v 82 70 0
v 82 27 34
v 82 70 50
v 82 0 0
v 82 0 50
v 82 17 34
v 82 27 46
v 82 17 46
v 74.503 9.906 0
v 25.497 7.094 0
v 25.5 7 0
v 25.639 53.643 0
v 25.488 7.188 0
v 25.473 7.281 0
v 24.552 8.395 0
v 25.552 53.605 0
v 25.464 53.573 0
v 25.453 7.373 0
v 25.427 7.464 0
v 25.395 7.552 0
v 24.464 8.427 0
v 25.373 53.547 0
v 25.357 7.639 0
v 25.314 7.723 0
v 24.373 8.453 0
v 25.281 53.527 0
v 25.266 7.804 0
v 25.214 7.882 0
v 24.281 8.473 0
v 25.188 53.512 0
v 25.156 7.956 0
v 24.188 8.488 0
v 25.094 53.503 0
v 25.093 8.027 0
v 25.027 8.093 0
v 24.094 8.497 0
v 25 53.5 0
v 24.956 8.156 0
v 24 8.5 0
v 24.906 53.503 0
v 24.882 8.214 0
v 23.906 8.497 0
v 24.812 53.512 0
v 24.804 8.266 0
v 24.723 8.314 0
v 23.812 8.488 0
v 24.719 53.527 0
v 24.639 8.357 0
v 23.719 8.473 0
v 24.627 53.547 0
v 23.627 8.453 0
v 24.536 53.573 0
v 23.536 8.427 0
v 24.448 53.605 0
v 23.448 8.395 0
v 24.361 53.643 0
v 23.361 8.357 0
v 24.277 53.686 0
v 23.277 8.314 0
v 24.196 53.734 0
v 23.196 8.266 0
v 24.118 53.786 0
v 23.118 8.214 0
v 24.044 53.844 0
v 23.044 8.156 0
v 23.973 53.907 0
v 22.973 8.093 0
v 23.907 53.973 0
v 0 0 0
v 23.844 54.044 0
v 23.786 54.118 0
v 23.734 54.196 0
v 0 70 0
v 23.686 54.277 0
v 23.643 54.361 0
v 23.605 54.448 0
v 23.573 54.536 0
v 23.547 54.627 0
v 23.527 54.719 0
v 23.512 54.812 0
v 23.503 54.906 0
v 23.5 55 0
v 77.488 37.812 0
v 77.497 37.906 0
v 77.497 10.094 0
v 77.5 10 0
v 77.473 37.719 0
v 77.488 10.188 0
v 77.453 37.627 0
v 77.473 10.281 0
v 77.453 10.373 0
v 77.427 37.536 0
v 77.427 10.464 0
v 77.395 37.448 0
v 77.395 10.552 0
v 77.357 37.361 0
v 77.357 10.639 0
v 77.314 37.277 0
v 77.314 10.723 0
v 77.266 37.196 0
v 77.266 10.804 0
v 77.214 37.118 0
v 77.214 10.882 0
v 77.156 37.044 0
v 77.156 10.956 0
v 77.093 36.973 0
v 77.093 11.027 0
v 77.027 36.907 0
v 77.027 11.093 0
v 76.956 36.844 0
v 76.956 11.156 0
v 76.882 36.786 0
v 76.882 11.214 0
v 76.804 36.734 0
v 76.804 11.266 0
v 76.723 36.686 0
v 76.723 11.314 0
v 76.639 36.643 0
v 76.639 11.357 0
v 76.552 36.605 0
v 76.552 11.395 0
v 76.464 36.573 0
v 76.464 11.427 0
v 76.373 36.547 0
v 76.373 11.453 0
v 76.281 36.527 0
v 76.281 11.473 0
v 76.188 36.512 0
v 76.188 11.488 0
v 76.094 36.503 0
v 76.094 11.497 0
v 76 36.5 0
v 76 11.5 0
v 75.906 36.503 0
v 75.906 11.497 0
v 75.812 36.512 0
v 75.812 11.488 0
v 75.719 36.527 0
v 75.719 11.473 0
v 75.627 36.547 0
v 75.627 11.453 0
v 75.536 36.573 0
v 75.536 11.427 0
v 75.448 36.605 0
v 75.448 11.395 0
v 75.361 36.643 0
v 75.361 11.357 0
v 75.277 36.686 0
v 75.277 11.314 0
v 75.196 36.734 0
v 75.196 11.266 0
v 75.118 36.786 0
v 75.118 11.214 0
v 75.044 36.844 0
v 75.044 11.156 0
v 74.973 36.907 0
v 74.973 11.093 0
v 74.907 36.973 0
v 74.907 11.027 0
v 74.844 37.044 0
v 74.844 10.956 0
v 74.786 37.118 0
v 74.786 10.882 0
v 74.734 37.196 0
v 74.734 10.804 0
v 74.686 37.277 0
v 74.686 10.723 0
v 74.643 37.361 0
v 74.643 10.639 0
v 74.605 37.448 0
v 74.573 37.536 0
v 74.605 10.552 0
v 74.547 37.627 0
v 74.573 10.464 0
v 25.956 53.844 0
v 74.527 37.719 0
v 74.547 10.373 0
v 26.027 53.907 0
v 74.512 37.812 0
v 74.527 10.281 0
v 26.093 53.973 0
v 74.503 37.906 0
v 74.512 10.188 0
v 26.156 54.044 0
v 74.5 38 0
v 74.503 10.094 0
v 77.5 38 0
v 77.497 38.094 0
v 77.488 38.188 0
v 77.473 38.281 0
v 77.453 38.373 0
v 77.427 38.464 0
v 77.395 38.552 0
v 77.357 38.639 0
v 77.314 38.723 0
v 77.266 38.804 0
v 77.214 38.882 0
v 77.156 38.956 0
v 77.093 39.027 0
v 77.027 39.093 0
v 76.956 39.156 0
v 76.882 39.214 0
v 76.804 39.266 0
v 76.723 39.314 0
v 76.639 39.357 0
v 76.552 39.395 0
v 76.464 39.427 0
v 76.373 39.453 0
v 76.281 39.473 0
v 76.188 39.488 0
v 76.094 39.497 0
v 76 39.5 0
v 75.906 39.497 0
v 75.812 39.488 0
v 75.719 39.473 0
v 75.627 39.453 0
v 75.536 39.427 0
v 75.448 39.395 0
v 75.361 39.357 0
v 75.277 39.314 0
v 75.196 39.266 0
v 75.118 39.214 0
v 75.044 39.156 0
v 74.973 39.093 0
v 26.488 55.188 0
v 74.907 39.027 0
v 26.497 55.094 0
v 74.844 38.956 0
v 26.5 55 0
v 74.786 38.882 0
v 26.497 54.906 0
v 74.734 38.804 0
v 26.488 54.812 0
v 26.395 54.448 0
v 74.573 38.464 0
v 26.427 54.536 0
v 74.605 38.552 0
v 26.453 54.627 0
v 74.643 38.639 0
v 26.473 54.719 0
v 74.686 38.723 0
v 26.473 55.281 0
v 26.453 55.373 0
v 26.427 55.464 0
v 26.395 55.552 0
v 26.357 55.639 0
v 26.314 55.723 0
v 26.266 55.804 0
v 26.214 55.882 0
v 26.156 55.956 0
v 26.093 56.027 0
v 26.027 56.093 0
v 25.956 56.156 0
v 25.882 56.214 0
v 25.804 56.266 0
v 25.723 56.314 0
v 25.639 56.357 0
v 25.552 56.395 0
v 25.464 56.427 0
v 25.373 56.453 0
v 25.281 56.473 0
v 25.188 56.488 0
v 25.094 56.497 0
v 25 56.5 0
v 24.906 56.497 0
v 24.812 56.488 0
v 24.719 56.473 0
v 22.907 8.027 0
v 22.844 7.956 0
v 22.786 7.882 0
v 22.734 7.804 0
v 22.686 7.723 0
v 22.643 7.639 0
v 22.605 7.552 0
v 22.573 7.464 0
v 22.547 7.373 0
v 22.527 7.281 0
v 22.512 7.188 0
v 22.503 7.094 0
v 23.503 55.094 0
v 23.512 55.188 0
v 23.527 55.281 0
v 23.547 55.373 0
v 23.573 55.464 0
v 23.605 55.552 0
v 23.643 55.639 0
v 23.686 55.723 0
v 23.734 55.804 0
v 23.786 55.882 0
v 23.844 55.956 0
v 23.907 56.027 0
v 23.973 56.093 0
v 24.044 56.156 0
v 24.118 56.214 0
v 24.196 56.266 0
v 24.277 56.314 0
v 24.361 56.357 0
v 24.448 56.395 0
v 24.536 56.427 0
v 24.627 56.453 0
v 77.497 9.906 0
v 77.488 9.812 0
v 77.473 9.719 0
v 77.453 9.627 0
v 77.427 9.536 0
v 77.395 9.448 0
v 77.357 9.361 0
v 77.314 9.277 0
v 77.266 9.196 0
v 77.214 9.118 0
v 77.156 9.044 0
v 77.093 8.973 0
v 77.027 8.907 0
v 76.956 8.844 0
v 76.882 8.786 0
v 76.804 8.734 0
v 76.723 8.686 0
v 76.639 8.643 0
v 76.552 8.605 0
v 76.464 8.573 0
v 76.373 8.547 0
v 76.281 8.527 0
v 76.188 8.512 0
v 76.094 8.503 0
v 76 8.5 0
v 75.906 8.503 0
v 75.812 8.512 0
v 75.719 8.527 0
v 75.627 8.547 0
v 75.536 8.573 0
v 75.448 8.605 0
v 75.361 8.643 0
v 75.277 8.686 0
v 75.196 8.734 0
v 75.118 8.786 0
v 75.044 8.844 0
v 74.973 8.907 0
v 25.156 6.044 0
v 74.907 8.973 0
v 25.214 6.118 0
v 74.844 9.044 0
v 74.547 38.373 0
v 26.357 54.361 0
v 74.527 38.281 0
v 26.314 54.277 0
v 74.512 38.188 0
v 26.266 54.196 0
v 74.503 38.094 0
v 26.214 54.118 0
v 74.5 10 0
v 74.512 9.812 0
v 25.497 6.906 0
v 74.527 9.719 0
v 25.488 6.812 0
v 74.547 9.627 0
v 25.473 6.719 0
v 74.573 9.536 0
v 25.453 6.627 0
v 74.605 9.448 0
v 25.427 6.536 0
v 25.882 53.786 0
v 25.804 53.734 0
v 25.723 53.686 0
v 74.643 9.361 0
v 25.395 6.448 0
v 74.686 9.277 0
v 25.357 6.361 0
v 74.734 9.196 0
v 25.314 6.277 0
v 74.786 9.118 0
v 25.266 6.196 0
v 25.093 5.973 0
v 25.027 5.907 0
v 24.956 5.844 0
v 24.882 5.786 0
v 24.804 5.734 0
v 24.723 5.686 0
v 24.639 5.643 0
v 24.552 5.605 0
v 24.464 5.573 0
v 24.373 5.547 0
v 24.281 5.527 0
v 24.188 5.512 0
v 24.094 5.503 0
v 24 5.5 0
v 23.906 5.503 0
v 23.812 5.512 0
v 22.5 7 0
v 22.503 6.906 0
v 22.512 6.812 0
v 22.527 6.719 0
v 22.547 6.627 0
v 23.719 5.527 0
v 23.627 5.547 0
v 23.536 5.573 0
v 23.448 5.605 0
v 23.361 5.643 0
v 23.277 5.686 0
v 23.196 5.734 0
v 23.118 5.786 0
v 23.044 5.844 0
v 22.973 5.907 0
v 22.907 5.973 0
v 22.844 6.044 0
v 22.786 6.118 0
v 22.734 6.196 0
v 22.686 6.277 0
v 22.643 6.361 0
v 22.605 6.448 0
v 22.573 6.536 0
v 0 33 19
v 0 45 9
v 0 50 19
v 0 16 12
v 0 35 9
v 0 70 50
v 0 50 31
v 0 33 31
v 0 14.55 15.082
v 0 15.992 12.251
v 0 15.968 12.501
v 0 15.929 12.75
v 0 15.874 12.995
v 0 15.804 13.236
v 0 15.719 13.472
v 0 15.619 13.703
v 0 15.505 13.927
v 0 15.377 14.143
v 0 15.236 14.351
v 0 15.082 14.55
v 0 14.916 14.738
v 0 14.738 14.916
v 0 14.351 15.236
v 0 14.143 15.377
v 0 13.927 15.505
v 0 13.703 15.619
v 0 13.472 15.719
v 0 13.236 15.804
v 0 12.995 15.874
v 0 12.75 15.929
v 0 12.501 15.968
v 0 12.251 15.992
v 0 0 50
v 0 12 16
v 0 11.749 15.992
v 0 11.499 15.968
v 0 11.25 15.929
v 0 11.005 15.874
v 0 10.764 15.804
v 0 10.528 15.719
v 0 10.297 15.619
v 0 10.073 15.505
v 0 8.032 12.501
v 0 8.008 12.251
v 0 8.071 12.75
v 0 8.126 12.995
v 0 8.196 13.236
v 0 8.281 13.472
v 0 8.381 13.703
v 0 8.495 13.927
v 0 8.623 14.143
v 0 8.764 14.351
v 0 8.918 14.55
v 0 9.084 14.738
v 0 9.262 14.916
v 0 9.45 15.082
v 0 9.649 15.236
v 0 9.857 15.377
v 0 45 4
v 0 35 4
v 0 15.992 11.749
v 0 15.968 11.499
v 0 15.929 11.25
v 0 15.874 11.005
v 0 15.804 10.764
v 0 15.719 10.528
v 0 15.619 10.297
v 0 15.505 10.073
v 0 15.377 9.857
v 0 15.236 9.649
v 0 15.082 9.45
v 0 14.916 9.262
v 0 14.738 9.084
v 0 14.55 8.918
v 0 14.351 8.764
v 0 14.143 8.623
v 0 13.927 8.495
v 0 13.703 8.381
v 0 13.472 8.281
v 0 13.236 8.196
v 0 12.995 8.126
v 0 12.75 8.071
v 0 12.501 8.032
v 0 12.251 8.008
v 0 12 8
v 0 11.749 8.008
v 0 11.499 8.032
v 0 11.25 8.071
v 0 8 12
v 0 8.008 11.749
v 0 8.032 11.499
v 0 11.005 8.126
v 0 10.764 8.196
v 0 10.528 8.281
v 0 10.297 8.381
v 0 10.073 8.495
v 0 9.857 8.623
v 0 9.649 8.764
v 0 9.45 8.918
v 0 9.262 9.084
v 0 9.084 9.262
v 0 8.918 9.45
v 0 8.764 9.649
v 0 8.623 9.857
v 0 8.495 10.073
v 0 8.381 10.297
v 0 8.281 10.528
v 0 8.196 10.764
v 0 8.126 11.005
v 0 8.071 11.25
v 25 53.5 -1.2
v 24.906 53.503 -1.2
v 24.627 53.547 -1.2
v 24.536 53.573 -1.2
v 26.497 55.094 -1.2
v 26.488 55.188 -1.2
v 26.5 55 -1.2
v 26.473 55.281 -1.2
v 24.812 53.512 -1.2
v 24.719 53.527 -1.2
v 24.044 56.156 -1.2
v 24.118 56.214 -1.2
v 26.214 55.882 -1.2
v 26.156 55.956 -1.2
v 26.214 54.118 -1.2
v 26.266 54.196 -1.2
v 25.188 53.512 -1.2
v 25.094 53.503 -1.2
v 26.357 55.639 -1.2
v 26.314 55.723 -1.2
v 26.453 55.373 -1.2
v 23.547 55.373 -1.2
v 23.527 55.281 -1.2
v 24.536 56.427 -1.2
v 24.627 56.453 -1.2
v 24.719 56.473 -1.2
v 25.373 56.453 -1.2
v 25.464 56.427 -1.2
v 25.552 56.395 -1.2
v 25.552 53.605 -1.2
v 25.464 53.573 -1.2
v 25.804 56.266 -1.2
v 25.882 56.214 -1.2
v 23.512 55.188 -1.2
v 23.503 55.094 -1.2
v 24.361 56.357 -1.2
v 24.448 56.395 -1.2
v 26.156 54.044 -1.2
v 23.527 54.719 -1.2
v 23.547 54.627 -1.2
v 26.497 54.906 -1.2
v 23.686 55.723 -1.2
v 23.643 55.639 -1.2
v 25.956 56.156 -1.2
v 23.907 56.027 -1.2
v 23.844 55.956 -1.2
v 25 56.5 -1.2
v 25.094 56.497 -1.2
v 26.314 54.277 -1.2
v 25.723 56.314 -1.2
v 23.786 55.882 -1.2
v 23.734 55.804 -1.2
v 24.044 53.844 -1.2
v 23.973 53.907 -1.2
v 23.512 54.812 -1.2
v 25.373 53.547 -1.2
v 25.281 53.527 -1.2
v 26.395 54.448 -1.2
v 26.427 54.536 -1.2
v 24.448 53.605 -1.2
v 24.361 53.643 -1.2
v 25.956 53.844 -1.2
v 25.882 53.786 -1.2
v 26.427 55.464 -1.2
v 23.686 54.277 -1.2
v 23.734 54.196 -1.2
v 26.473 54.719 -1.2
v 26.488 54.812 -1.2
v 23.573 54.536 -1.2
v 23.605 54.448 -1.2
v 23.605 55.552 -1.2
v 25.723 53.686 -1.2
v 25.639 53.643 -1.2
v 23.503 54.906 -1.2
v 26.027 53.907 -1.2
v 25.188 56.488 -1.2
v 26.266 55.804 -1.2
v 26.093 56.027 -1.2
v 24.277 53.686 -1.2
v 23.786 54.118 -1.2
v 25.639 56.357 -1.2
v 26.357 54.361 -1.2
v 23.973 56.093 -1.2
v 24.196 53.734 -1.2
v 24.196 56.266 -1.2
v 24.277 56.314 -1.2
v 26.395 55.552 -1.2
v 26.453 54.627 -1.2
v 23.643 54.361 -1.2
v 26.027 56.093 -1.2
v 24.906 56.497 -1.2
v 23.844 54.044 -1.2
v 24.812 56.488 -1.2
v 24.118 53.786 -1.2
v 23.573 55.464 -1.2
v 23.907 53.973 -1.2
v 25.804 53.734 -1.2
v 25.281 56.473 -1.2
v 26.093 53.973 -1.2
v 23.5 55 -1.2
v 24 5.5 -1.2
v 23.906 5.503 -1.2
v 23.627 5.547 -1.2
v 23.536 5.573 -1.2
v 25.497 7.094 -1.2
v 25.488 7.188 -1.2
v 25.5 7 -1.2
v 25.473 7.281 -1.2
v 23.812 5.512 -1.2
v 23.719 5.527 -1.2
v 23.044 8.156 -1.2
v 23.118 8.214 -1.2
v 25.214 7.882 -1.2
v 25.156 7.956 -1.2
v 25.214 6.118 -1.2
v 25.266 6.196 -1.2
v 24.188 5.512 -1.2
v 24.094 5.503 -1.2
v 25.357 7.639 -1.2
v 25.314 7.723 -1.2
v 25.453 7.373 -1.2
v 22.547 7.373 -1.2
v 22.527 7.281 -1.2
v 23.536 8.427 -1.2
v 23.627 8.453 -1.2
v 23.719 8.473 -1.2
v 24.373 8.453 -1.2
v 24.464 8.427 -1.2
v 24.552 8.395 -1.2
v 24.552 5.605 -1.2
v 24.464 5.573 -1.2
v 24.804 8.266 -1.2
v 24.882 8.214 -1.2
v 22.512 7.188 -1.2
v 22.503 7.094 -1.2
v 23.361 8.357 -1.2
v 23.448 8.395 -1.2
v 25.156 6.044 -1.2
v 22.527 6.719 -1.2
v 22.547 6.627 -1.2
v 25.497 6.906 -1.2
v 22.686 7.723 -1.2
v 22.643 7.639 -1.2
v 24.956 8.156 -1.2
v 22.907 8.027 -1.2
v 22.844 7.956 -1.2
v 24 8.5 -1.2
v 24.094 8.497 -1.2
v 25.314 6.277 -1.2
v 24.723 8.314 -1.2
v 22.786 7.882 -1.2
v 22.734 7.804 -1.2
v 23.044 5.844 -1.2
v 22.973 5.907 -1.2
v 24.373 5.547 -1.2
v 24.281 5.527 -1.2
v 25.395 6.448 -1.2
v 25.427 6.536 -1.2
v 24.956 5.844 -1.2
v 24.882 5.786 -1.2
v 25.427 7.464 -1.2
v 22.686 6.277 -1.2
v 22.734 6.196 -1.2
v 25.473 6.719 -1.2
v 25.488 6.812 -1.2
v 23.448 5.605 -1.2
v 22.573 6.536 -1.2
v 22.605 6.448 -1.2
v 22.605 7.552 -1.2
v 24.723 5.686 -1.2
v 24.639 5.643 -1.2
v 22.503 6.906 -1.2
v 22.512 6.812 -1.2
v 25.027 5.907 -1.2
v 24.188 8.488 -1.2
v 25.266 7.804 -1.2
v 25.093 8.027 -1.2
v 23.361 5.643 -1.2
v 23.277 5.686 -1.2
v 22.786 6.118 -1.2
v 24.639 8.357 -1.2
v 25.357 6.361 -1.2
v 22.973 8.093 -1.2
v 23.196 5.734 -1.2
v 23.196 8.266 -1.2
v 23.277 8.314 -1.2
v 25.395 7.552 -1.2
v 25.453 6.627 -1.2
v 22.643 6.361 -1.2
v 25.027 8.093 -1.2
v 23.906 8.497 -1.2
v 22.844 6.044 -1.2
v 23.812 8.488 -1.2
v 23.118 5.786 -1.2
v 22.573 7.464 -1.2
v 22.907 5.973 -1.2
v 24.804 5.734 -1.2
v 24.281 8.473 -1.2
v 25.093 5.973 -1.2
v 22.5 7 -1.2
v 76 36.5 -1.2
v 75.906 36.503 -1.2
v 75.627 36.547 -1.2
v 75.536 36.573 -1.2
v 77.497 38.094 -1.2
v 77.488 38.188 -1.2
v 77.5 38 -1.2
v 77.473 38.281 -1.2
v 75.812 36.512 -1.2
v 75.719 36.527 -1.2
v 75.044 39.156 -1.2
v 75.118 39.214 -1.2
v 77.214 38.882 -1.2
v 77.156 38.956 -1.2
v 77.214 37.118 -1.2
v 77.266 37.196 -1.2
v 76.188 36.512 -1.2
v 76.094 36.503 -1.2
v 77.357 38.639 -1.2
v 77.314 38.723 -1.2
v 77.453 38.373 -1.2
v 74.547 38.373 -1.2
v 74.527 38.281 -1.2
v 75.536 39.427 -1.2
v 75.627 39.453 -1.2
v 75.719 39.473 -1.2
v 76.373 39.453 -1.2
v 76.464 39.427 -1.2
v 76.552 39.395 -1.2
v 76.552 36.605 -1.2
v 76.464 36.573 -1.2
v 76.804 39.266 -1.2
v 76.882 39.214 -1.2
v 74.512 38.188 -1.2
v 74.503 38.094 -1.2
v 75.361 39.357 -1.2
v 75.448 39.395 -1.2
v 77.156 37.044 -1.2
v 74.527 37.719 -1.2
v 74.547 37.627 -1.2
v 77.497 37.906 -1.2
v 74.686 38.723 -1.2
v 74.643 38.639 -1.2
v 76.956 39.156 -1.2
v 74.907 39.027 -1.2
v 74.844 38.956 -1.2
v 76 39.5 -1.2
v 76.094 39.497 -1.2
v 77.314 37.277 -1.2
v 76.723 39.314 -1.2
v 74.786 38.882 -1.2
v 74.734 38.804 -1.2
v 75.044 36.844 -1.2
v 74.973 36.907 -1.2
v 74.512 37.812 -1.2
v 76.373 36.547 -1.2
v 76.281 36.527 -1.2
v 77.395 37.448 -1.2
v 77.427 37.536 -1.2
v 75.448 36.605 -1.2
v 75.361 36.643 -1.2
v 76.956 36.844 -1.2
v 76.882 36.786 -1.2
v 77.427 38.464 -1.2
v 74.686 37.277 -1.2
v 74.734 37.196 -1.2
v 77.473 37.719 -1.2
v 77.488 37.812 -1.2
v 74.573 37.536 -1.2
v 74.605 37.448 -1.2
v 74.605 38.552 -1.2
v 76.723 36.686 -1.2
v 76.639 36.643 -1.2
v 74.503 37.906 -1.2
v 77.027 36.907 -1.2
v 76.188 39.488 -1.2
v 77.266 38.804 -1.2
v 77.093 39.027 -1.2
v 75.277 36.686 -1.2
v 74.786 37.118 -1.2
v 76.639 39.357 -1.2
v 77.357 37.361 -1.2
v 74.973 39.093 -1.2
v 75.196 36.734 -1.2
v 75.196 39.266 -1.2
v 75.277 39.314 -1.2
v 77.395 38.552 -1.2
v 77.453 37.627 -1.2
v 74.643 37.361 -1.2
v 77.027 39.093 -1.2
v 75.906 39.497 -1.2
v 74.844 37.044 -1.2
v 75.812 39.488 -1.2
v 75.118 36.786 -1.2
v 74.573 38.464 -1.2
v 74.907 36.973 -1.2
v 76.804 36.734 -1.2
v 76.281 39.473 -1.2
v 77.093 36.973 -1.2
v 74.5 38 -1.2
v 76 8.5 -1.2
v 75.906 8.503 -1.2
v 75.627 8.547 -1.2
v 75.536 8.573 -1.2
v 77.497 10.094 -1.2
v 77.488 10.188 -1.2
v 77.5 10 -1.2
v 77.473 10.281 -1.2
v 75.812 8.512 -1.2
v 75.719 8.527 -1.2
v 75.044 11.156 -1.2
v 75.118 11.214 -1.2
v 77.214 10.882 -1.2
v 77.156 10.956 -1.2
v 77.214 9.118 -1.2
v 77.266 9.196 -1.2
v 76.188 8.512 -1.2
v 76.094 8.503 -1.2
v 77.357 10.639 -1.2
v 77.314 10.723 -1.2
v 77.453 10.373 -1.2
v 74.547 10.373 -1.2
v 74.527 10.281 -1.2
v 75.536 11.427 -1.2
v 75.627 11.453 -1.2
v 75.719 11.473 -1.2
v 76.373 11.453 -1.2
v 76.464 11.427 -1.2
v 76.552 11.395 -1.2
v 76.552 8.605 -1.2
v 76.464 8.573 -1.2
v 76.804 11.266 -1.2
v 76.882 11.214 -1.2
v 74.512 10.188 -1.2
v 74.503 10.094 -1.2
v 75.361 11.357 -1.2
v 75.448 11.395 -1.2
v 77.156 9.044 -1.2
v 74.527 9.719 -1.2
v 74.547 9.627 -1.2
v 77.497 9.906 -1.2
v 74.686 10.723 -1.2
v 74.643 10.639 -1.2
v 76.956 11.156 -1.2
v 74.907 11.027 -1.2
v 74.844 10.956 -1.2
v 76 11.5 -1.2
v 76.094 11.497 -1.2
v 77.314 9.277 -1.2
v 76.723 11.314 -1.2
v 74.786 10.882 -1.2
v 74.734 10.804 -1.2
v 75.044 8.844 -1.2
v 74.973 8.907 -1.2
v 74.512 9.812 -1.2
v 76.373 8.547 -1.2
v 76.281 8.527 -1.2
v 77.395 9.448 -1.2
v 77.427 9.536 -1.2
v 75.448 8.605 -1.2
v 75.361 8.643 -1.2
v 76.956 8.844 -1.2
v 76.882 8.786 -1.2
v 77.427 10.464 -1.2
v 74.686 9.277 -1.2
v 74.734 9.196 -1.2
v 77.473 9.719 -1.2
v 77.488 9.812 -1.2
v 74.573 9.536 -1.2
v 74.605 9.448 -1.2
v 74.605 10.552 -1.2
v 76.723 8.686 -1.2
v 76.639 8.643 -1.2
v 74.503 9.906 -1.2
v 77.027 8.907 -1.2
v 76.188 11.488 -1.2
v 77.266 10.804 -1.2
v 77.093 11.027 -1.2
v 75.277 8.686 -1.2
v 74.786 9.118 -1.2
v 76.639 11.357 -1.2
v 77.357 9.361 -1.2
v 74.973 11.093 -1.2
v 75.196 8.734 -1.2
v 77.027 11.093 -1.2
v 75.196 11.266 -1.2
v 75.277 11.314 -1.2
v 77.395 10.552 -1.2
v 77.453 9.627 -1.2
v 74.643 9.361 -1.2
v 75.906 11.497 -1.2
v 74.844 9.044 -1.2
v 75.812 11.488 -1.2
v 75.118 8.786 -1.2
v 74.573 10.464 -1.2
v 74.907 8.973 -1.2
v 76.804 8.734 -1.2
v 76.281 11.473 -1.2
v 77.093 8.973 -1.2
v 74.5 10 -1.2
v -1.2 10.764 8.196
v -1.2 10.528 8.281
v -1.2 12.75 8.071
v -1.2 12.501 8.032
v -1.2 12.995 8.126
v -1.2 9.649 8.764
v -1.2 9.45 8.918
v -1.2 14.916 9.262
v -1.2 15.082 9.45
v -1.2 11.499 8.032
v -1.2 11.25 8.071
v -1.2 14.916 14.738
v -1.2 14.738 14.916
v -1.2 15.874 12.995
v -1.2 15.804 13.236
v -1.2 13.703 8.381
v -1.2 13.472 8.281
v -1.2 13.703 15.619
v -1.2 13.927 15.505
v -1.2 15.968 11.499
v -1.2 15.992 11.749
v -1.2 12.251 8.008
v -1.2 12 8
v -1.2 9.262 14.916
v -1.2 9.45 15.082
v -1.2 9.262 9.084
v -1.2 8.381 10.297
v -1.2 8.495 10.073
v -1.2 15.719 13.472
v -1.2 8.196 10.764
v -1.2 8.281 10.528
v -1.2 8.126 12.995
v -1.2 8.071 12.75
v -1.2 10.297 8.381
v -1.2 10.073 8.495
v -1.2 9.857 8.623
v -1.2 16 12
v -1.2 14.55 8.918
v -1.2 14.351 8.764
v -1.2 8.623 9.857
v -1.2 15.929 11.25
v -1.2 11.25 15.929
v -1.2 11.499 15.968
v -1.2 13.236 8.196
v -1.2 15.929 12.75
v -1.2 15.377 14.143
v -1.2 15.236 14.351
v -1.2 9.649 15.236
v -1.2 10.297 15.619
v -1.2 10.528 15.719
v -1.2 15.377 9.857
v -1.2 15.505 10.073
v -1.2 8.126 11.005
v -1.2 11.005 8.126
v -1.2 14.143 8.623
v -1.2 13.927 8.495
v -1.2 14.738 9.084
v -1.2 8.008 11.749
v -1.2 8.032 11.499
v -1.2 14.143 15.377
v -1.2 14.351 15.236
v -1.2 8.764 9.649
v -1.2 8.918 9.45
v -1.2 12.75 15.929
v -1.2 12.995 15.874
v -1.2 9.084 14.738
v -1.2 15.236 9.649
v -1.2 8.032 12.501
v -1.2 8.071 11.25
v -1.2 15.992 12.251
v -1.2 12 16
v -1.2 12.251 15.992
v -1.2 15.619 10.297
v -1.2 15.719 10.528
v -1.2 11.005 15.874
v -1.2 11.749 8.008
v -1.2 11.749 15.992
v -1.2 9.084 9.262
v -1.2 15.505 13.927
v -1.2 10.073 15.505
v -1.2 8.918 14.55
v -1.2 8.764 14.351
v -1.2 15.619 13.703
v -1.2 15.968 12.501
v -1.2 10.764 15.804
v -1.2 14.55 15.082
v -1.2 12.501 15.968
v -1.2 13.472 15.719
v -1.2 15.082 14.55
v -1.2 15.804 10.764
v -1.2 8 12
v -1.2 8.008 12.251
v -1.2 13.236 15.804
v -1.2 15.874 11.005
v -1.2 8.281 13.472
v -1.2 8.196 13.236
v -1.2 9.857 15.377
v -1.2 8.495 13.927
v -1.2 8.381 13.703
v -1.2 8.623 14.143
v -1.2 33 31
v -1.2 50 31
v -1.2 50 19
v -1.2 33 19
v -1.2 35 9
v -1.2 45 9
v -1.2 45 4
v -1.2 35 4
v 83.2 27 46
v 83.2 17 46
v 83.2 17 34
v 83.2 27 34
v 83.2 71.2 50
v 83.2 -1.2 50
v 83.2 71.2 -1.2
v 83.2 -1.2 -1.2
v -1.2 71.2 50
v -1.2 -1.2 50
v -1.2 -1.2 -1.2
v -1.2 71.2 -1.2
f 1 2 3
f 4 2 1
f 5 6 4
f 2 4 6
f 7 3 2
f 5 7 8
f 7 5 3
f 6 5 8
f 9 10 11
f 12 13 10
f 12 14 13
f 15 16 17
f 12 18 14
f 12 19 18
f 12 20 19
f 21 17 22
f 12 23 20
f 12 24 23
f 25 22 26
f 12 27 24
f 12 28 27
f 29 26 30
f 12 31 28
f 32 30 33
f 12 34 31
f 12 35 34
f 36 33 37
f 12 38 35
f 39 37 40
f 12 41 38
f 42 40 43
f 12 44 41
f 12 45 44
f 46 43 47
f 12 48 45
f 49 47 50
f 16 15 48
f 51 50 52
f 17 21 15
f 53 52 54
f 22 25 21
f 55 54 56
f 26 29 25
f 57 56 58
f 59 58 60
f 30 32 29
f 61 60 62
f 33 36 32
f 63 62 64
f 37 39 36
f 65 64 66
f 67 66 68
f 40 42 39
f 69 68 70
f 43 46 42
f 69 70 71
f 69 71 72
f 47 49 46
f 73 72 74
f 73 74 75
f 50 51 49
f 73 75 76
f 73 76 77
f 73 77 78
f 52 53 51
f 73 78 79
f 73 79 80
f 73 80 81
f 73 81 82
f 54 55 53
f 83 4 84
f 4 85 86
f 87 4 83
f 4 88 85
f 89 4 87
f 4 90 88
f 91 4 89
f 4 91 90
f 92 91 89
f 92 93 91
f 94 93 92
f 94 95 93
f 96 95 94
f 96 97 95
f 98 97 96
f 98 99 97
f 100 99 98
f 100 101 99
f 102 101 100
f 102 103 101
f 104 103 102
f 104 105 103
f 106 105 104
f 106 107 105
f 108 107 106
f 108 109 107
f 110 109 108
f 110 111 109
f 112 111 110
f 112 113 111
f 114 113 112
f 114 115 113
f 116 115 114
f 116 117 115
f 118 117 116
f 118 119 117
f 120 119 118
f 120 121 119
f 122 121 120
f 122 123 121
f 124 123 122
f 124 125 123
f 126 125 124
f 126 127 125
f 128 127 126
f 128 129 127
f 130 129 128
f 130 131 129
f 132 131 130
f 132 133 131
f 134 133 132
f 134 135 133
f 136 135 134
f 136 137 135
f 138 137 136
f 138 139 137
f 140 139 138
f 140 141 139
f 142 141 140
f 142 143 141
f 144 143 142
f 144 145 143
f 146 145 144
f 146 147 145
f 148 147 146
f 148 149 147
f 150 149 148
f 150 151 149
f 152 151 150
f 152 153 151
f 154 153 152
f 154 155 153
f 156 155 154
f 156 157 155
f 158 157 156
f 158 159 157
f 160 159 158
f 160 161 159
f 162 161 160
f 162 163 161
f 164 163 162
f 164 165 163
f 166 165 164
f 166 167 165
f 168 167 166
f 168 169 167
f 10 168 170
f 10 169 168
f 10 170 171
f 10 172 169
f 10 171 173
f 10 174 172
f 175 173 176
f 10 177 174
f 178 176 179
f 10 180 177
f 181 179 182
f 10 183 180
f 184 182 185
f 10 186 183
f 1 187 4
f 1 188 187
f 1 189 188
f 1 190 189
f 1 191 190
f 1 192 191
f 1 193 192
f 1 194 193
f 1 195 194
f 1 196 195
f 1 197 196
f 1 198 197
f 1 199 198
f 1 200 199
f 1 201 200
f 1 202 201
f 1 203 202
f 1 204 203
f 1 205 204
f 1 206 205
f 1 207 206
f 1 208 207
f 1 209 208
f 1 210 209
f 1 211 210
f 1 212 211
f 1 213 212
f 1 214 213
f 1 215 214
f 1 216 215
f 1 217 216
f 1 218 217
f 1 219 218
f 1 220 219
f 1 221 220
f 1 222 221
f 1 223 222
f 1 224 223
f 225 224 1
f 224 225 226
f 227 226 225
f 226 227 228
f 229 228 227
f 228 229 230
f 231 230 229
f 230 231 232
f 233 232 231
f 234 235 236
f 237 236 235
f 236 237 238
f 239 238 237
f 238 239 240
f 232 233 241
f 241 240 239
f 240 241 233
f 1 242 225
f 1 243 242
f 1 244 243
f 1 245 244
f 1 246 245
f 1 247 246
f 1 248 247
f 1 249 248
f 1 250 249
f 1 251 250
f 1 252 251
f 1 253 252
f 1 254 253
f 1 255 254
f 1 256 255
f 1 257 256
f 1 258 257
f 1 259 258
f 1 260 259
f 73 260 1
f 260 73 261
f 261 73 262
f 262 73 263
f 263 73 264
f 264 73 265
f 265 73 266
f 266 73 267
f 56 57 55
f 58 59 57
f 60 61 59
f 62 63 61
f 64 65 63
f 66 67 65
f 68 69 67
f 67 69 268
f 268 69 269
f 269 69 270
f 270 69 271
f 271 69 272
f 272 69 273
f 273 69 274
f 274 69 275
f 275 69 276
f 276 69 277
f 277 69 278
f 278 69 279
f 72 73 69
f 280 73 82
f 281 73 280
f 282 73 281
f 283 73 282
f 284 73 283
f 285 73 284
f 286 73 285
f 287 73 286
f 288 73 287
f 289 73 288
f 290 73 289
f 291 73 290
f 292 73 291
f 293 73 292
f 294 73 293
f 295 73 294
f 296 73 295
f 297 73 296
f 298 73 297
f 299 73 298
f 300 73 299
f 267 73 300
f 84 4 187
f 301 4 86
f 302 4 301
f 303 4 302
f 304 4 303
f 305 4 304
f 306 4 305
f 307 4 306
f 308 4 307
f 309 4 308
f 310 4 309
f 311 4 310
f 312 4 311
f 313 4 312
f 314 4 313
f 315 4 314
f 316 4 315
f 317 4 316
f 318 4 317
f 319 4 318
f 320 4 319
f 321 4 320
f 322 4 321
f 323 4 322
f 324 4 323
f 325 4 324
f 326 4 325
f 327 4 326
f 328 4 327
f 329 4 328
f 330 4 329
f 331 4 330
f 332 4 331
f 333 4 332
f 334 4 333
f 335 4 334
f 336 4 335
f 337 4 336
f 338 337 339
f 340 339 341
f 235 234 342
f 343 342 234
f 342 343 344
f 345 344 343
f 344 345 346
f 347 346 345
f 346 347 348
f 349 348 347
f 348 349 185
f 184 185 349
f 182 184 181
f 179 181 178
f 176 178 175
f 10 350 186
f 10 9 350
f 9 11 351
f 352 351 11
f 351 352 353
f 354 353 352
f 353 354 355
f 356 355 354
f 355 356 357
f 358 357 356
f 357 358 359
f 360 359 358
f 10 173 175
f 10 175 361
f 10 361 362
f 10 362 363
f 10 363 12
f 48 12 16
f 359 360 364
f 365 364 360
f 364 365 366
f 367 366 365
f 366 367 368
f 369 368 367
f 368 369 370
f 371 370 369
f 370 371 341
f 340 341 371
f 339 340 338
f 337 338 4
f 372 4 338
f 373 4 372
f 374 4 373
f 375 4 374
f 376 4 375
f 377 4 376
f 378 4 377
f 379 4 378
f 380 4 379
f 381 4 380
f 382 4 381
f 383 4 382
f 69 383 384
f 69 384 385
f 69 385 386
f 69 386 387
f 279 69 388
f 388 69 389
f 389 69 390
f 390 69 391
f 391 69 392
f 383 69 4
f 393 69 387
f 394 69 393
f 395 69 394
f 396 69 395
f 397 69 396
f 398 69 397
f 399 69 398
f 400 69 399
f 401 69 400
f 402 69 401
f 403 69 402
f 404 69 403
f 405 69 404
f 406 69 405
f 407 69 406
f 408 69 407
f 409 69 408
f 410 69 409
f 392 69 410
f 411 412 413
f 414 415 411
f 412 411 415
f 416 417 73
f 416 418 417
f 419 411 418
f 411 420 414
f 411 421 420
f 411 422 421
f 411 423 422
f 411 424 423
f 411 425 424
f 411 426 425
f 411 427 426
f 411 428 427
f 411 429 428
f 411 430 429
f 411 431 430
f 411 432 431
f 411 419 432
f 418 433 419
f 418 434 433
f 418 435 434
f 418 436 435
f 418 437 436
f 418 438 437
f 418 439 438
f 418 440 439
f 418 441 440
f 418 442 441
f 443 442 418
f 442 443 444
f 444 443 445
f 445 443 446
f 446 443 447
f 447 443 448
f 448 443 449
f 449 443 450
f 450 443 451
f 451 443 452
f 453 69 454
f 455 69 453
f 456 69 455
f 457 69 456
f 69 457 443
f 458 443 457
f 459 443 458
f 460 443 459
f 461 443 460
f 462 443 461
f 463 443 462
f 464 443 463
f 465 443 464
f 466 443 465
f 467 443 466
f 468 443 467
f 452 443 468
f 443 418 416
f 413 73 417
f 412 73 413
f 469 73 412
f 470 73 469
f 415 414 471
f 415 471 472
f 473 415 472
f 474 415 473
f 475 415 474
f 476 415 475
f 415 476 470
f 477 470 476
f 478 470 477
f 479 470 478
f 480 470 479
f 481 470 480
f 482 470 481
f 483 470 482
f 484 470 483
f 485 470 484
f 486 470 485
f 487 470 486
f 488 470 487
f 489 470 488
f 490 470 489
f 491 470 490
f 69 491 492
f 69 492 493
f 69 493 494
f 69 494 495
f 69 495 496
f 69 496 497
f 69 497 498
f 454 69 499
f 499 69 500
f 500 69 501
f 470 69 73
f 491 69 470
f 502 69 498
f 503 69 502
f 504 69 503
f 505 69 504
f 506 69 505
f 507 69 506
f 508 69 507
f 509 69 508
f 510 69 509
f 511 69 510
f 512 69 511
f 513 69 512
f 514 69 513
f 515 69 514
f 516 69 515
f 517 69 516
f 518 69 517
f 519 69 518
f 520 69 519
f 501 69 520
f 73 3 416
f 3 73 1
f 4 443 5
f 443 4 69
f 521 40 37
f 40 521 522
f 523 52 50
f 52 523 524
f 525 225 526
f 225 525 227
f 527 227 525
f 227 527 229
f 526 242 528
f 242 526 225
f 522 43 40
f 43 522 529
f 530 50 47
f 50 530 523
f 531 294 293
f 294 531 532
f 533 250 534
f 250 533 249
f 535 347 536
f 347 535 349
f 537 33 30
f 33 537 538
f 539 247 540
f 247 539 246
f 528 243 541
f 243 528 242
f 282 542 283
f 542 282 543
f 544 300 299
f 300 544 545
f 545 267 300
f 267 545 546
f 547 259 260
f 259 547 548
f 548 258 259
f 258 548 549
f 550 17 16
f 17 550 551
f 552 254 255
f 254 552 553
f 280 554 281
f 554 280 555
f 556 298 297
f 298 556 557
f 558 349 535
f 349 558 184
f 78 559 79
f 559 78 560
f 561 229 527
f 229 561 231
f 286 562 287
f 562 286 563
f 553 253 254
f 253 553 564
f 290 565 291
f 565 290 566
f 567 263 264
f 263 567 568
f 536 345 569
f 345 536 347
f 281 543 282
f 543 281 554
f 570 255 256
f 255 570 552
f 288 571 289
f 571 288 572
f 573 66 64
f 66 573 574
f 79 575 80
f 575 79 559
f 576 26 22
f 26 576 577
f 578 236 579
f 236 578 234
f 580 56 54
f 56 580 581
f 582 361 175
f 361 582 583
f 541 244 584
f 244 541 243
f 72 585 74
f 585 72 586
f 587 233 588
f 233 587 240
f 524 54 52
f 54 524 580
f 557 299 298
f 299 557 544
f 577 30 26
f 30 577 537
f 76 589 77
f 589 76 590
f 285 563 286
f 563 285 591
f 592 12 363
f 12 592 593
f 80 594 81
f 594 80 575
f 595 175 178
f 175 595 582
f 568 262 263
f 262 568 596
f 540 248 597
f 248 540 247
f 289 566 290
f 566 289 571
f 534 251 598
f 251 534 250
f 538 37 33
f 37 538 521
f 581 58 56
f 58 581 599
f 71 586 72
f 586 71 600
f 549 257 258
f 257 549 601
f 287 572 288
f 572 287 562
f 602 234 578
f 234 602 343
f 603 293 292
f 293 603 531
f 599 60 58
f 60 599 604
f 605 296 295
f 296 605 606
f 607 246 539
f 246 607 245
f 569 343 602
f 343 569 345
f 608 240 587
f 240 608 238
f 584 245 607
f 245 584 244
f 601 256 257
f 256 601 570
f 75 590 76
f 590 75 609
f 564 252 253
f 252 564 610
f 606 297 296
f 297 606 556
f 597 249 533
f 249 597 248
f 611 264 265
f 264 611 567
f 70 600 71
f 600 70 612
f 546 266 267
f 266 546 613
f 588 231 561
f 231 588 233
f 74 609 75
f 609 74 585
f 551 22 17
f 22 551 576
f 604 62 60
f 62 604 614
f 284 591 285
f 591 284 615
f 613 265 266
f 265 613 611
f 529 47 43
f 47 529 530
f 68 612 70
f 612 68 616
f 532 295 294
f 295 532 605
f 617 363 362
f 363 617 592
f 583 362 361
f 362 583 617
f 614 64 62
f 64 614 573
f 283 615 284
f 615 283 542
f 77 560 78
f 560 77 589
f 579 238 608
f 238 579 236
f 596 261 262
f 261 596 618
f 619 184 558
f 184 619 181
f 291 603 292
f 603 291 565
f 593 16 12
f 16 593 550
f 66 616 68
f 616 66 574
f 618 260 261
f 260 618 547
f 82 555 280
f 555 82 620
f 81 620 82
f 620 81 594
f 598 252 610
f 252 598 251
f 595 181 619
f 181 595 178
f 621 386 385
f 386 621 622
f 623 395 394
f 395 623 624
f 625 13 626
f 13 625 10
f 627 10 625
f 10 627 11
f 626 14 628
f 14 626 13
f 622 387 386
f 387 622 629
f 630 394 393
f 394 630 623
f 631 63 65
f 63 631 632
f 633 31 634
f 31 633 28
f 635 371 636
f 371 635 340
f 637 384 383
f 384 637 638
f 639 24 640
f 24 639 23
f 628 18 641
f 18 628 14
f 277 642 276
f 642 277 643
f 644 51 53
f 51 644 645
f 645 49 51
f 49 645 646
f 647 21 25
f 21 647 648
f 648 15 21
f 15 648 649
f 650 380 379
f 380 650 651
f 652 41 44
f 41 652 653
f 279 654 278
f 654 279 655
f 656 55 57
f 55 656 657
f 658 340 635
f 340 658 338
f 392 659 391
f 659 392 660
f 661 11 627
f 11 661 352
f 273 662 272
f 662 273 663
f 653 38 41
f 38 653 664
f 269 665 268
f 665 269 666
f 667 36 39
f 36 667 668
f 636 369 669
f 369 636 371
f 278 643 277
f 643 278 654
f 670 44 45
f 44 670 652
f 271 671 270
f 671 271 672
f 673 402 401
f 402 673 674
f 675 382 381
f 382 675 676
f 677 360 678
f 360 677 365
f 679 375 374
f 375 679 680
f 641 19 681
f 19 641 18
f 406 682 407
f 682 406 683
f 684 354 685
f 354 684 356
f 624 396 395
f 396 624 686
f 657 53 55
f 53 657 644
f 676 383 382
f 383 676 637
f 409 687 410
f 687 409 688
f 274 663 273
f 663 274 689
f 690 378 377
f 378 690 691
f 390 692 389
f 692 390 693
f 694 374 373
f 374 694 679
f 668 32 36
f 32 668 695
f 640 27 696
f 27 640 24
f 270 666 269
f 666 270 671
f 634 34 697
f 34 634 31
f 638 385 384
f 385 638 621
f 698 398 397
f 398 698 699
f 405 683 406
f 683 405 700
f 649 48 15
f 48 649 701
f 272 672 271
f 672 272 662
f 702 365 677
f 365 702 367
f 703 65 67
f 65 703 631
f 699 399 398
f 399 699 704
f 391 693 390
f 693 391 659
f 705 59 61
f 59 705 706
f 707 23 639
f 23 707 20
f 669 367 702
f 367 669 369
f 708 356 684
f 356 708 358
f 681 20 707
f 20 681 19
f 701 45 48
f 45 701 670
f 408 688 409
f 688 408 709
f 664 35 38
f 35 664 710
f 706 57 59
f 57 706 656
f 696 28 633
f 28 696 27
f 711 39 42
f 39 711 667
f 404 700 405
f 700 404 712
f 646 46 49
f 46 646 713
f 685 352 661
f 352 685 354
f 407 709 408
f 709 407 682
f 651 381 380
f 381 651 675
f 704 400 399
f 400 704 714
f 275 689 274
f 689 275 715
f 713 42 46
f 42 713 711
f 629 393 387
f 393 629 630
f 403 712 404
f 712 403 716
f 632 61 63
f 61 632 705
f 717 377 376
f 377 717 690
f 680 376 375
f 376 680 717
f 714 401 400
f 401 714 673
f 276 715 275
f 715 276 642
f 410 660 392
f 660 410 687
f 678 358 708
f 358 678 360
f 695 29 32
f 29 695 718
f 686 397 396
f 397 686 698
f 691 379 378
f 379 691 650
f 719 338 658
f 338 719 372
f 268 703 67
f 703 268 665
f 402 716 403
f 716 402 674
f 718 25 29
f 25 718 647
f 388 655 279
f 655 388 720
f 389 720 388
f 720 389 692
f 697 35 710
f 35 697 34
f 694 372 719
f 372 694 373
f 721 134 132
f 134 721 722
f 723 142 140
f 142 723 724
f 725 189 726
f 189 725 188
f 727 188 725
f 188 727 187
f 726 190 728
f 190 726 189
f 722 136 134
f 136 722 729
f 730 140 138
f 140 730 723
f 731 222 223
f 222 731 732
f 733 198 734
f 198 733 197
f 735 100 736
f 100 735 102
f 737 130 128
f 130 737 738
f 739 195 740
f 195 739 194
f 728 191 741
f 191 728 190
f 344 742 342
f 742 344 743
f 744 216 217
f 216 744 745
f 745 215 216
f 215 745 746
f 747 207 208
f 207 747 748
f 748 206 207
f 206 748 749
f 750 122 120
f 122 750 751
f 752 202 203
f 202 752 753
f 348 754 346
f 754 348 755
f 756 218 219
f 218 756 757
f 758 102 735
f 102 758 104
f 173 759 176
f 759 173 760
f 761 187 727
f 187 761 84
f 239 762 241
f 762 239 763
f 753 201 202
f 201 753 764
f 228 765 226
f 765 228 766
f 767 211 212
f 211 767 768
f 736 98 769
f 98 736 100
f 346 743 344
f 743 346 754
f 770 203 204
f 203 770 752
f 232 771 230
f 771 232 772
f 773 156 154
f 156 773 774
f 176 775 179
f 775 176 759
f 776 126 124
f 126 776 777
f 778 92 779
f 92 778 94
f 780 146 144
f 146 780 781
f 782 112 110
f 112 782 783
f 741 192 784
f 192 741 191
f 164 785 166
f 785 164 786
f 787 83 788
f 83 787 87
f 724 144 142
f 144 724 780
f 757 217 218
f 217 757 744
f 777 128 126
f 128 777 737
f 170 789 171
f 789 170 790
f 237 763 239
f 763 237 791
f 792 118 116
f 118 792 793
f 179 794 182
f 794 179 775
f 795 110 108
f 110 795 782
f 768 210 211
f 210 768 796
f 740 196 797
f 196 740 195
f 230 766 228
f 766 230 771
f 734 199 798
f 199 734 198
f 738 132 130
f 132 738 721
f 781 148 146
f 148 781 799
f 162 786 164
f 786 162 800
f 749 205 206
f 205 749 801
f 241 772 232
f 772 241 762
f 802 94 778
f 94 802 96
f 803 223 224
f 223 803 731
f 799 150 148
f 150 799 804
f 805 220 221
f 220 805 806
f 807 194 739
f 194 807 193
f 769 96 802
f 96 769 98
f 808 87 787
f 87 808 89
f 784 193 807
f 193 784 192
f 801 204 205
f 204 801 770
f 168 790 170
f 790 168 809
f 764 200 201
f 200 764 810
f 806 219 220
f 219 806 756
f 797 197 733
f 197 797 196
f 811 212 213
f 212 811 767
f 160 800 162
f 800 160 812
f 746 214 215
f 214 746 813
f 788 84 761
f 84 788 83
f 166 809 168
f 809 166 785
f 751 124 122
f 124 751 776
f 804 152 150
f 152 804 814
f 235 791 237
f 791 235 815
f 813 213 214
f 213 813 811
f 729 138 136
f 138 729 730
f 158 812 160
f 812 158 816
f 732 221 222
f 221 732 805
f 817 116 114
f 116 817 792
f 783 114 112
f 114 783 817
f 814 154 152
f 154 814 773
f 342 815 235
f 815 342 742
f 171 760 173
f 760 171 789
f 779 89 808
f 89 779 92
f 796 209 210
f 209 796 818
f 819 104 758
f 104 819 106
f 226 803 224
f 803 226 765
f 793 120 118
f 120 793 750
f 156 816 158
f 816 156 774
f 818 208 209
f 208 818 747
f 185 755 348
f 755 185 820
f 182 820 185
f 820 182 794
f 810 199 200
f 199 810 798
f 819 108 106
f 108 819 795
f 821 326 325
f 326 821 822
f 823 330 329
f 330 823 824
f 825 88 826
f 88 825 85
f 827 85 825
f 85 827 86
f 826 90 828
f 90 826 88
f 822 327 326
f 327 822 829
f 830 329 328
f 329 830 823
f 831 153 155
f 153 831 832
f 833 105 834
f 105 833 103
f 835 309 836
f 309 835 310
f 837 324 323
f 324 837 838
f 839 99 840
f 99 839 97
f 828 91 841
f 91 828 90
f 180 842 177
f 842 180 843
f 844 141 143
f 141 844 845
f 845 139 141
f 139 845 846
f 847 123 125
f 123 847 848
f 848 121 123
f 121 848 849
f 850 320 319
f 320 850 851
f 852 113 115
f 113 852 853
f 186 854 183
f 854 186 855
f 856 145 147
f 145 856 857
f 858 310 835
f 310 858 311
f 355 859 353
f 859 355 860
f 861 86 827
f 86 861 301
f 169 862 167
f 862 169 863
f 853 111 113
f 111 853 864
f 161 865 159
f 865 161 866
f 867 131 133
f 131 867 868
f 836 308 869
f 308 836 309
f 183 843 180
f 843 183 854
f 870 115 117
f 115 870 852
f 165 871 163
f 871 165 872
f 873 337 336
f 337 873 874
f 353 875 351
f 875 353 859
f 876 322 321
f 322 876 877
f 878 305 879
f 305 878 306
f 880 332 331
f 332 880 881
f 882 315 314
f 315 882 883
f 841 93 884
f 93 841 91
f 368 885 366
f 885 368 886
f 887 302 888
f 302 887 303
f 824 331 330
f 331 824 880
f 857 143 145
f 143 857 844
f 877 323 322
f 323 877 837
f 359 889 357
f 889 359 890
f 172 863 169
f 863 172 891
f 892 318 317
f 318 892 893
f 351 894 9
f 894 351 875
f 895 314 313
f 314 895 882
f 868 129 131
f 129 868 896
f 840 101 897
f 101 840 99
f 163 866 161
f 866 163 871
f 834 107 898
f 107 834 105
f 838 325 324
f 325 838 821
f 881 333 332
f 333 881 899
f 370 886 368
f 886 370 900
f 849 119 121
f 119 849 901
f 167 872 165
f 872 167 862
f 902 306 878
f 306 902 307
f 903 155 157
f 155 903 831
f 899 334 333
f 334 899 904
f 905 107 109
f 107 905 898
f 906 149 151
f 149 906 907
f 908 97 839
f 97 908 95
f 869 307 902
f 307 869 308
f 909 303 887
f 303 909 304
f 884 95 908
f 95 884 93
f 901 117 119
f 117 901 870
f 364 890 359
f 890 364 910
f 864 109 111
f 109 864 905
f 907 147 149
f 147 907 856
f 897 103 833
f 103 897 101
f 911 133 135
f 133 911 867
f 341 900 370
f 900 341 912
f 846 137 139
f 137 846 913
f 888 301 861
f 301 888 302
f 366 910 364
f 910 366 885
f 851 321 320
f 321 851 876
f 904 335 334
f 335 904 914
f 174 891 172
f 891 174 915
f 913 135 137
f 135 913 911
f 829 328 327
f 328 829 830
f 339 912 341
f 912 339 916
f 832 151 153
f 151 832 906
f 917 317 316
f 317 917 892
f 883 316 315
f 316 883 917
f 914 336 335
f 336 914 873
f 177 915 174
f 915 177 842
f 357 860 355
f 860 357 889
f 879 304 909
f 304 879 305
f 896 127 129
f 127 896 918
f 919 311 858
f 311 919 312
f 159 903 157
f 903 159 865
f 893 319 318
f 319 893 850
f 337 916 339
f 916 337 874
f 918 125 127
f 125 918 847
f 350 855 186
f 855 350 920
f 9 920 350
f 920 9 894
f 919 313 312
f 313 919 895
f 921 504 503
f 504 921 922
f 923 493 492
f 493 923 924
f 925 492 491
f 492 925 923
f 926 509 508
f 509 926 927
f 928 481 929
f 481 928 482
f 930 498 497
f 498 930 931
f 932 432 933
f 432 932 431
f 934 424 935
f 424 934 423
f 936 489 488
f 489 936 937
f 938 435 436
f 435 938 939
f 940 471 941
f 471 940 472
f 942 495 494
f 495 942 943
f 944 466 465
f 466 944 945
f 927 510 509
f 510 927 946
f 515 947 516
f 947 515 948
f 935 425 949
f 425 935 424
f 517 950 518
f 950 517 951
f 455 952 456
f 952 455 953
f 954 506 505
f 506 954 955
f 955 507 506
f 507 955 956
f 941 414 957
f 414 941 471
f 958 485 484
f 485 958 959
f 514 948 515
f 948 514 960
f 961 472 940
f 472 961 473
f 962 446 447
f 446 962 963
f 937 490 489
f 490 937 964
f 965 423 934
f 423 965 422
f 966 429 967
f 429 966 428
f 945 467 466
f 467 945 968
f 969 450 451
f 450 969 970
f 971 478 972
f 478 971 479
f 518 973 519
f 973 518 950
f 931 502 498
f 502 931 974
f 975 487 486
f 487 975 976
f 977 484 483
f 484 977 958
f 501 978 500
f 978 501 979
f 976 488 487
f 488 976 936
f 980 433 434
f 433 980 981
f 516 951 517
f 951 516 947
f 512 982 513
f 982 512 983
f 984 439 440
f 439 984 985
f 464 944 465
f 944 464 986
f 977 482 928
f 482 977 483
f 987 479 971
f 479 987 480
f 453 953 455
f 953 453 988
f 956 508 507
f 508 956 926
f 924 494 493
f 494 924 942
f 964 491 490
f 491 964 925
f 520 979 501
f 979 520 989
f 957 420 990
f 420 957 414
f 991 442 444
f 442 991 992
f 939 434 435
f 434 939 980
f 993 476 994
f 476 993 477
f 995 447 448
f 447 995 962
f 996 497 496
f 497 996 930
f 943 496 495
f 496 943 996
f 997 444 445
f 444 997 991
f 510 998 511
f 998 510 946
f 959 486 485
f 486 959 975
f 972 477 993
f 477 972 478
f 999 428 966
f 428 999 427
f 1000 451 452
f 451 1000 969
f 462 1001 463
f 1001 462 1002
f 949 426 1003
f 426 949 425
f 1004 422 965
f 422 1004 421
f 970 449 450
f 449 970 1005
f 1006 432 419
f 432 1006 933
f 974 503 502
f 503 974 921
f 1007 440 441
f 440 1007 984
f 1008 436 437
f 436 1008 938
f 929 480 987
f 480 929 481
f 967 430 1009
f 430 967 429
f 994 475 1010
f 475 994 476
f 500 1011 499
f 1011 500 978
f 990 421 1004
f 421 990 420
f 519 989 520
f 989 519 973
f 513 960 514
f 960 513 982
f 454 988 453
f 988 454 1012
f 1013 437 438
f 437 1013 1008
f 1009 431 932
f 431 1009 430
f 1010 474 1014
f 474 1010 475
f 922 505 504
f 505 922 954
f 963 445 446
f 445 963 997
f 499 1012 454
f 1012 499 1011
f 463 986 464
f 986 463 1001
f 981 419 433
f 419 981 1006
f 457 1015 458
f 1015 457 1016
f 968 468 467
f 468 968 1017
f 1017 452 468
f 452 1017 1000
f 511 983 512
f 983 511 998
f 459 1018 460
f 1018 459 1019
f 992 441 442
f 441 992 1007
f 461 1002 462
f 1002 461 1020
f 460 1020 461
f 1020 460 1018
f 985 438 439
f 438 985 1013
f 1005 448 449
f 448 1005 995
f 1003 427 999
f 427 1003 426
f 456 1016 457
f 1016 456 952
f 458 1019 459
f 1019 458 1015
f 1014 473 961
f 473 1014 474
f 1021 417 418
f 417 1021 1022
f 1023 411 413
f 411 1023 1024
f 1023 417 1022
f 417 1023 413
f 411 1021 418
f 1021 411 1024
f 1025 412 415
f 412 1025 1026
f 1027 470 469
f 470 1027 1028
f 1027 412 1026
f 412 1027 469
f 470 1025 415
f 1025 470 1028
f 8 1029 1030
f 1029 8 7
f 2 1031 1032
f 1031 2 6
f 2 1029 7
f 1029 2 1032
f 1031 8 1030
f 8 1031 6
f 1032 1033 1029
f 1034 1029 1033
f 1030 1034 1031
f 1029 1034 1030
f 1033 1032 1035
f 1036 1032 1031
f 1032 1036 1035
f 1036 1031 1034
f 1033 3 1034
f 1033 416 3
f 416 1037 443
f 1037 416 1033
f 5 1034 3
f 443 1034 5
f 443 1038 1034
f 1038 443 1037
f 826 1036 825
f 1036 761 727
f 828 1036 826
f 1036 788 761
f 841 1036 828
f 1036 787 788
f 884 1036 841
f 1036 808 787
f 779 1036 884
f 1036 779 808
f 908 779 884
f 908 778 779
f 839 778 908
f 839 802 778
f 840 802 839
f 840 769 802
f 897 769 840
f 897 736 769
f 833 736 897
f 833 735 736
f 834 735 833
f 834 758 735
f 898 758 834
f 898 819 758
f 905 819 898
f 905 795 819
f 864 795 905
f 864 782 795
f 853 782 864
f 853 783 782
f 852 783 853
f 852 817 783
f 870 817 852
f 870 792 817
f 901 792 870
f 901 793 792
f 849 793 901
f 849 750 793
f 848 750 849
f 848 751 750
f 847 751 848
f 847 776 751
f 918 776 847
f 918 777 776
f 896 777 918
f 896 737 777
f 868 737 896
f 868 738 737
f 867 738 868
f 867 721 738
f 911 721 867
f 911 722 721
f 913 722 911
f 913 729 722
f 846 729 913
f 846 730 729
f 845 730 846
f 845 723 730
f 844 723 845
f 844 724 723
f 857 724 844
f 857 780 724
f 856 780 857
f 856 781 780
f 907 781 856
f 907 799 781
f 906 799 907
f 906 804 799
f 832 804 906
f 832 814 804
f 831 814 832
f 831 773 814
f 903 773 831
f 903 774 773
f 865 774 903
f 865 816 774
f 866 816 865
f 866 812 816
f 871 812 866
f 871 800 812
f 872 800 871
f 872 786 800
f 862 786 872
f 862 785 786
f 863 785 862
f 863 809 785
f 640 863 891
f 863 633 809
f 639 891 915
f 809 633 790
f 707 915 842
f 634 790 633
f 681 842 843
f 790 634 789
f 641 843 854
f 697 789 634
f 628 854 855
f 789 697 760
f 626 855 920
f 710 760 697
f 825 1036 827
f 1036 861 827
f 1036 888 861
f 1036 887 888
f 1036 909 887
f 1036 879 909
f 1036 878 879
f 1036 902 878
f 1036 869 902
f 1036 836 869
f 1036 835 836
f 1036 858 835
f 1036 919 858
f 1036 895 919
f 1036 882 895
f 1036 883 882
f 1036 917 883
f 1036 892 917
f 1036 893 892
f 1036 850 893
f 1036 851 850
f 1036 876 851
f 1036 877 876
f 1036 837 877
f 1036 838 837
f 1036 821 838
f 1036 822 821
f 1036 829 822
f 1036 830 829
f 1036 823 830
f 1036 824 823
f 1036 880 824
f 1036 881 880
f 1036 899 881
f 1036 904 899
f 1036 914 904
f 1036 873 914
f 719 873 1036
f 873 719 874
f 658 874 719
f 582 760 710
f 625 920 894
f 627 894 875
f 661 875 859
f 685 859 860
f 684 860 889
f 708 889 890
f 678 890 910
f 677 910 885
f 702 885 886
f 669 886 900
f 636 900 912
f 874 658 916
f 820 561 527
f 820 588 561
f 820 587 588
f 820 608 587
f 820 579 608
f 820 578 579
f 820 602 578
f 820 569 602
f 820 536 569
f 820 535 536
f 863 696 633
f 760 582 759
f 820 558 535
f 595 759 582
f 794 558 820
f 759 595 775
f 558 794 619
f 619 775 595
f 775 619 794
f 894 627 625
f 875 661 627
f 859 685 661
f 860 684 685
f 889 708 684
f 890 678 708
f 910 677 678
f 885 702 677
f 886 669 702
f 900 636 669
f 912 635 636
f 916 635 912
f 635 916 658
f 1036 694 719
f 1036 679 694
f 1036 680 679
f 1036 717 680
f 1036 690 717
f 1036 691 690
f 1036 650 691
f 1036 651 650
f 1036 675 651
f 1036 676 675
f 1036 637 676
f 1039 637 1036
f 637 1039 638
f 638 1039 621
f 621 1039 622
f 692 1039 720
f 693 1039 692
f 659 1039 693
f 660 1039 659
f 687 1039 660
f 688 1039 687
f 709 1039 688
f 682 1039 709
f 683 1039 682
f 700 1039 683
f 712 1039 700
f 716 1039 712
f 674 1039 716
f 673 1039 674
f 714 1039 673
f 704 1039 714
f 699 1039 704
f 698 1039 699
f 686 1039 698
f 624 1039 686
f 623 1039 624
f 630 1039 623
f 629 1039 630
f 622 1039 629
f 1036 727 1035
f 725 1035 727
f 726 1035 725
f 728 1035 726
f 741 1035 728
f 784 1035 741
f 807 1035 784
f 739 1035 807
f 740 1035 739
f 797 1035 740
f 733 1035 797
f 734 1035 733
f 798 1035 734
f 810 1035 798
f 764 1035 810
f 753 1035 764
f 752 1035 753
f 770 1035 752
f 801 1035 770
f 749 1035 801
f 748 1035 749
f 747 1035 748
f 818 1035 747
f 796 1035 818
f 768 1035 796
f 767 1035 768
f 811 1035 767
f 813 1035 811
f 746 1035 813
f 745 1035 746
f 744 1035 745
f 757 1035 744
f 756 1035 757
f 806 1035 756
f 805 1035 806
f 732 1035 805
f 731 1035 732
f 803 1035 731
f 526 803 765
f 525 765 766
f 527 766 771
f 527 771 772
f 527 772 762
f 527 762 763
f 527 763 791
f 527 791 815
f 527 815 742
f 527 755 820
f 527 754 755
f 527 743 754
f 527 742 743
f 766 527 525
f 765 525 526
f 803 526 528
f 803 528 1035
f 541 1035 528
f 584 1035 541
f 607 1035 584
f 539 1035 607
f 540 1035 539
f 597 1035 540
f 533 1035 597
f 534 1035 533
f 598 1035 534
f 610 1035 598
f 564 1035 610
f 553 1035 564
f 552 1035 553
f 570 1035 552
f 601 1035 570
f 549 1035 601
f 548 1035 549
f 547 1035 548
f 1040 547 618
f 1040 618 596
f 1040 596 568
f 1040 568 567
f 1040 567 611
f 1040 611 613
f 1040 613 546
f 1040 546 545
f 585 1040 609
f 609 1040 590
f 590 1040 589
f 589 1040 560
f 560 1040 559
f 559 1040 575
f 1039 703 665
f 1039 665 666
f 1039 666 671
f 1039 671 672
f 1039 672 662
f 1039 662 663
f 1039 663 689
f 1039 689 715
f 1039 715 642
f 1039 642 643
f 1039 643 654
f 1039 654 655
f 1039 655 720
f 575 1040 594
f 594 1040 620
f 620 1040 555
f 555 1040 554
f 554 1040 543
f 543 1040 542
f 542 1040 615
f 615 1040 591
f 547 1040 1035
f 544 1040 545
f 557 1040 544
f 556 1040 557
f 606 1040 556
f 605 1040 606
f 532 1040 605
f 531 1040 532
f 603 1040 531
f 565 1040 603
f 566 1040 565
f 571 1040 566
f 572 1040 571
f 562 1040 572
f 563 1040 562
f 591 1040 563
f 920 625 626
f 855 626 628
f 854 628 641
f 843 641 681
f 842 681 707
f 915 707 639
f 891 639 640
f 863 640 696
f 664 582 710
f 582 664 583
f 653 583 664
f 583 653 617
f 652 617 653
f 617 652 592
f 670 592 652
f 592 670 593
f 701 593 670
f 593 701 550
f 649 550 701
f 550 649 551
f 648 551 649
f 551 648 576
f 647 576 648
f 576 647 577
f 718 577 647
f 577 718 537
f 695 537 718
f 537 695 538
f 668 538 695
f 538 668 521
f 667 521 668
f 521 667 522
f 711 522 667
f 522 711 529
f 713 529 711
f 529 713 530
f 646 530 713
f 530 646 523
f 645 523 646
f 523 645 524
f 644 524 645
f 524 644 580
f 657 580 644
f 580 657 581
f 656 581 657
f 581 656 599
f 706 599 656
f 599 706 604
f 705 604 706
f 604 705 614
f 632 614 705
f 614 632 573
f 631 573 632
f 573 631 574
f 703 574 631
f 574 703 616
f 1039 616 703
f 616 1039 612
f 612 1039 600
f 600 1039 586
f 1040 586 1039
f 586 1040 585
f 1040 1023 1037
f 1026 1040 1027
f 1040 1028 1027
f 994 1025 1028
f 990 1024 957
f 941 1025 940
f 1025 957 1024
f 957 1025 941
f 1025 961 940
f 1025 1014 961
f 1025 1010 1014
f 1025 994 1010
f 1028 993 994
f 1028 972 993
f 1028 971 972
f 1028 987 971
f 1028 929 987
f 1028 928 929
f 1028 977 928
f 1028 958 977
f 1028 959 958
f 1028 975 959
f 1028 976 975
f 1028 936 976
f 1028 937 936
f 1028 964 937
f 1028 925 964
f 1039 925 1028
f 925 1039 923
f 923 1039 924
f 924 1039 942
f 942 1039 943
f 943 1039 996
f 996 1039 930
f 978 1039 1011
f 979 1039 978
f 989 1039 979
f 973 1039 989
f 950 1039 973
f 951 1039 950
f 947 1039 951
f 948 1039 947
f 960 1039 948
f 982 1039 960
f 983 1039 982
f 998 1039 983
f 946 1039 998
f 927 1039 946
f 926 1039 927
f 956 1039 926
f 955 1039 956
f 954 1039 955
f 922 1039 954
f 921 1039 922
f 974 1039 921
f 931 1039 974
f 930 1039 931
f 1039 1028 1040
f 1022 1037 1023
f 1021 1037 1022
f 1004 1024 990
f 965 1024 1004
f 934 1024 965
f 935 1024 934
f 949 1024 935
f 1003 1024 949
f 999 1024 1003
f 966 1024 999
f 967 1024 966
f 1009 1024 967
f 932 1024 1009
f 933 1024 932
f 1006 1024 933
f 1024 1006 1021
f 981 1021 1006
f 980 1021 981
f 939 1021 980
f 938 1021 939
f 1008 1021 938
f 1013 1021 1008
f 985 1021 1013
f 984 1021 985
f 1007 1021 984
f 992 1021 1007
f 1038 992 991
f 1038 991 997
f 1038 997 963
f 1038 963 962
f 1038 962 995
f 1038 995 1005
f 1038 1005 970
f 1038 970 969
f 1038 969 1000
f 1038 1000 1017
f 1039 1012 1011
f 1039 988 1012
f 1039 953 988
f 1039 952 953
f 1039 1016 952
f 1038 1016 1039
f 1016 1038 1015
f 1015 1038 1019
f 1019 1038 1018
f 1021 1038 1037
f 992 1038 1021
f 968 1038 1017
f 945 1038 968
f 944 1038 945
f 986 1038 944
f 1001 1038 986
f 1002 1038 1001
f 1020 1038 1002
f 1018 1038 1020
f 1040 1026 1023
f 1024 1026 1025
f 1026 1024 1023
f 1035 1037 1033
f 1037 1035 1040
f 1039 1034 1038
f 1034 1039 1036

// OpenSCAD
MARGIN = 1; // marge de sécurité sur les mesures pour les trous
HAUTEUR = 50; // hauteur du boîtier (intérieur): z
HAUTEUR_BAS = 3; // compenser en bas (z) (soudures en dessous de l'Arduino)
LARGEUR = 70; // largeur du boîtier (intérieur): y
LARGEUR_D = 4; // de combien la plaque dépasse à droite: y
LARGEUR_G = 14; // de combien la plaque dépasse à gauche: y
LONGUEUR = 82; // Longueur du boîtier (intérieur): x
EPAISSEUR = 1.2; // épaisseur des parois

module create_boitier() {
difference(){
    translate([-EPAISSEUR,-EPAISSEUR,-EPAISSEUR])
        cube([LONGUEUR+2*EPAISSEUR,LARGEUR+2*EPAISSEUR,HAUTEUR+EPAISSEUR]);
    
    union(){
        // intérieur de la boîte
        translate([0, 0, 0])
		    cube([LONGUEUR, LARGEUR, HAUTEUR+2]);
        
        // Trous de 3mm au fond du boîtier
        
        translate([25, 55, -EPAISSEUR-1])
            cylinder(d=3, h=100, $fn=100);
        translate([24, 7, -EPAISSEUR-1])
            cylinder(d=3, h=100, $fn=100);

        translate([76, 38, -EPAISSEUR-1])
            cylinder(d=3, h=100, $fn=100);
        translate([76, 10, -EPAISSEUR-1])
            cylinder(d=3, h=100, $fn=100);
        
        // trou pour l'alimentation
        translate([-15, 8+LARGEUR_D, 9+HAUTEUR_BAS])
            rotate([0,90,0])
                cylinder(d=6+2*MARGIN, h=20, $fn=100);
        
        // trou pour USB
        translate([-10, 30+LARGEUR_D-MARGIN, 17-MARGIN+HAUTEUR_BAS])
			cube([20, 15+2*MARGIN, 10+2*MARGIN]);
            
        // trou pour mini-USB
        translate([-10, 32+LARGEUR_D-MARGIN, MARGIN+HAUTEUR_BAS])
			cube([20, 8+2*MARGIN, 5]);
            
        // trou pour la diode (IR receiver)
        translate([LONGUEUR-10, 18-MARGIN, 32-MARGIN+HAUTEUR_BAS])
			cube([20, 8+2*MARGIN, 10+2*MARGIN]);
	}
    }
}

// Créer le modèle 3D du boîtier
create_boitier();

// VUES: pour mesure sur QCAD

// vue de devant (USB, alim, mini-USB)
//projection(cut = true){
//    translate([0,0,-EPAISSEUR/2]) {
//        rotate([0,90,0]) {
//            create_boitier();
//        }
//    }
//}

// vue de derrière (diode)
//projection(cut = true){
//    translate([0,0,-LONGUEUR-EPAISSEUR/2]) {
//        rotate([0,270,0]) {
//            create_boitier();
//        }
//    }
//}

//vue de dessous (vis)
//projection(cut = true){
//    translate([0,0,EPAISSEUR/2]) {
//        rotate([0,0,0]) {
//            create_boitier();
//        }
//    }
//}
